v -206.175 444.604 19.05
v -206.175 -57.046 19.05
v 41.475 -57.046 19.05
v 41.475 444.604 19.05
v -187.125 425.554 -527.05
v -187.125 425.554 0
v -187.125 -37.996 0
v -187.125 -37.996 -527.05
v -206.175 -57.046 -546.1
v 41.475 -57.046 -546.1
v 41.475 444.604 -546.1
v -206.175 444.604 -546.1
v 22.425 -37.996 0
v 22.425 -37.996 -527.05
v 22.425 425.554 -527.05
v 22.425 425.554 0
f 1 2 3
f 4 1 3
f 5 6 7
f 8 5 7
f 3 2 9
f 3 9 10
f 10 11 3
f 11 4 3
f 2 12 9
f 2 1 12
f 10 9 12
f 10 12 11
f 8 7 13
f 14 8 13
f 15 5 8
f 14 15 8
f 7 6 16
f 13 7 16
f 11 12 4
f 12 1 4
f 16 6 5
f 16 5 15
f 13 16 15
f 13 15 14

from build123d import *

# Parameters (mm, degrees)
F0_W     = 247.65
F0_H     = 501.65
F1_DEPTH = 19.05
F2_W     = 247.65
F2_H     = 501.65
F2_W_2   = 209.55
F2_H_2   = 463.55
F3_DEPTH = 546.1
F4_W     = 501.65
F4_H     = 19.05
F5_DEPTH = 247.65


with BuildPart() as f1:
    # F0 (on Top) → F1 (new body)
    with BuildSketch(Plane.XY):
        with Locations((-82.35004, 193.778881)):
            Rectangle(F0_W, F0_H)
    extrude(amount=F1_DEPTH)

    # F2 (on face) → F3 (join)
    with BuildSketch(Plane(origin=(0, 0, 0), x_dir=(1, 0, 0), z_dir=(0, 0, -1))):
        with Locations((-82.35004, -193.778881)):
            Rectangle(F2_W, F2_H)
        with Locations((-82.35004, -193.778881)):
            Rectangle(F2_W_2, F2_H_2, mode=Mode.SUBTRACT)
    extrude(amount=F3_DEPTH)

    # F4 (on face) → F5 (join)
    with BuildSketch(Plane(origin=(-206.17504, 0, 0), x_dir=(0, -1, 0), z_dir=(-1, 0, 0))):
        with Locations((-193.778881, -536.575)):
            Rectangle(F4_W, F4_H)
    extrude(amount=-F5_DEPTH)


solid = f1.part
